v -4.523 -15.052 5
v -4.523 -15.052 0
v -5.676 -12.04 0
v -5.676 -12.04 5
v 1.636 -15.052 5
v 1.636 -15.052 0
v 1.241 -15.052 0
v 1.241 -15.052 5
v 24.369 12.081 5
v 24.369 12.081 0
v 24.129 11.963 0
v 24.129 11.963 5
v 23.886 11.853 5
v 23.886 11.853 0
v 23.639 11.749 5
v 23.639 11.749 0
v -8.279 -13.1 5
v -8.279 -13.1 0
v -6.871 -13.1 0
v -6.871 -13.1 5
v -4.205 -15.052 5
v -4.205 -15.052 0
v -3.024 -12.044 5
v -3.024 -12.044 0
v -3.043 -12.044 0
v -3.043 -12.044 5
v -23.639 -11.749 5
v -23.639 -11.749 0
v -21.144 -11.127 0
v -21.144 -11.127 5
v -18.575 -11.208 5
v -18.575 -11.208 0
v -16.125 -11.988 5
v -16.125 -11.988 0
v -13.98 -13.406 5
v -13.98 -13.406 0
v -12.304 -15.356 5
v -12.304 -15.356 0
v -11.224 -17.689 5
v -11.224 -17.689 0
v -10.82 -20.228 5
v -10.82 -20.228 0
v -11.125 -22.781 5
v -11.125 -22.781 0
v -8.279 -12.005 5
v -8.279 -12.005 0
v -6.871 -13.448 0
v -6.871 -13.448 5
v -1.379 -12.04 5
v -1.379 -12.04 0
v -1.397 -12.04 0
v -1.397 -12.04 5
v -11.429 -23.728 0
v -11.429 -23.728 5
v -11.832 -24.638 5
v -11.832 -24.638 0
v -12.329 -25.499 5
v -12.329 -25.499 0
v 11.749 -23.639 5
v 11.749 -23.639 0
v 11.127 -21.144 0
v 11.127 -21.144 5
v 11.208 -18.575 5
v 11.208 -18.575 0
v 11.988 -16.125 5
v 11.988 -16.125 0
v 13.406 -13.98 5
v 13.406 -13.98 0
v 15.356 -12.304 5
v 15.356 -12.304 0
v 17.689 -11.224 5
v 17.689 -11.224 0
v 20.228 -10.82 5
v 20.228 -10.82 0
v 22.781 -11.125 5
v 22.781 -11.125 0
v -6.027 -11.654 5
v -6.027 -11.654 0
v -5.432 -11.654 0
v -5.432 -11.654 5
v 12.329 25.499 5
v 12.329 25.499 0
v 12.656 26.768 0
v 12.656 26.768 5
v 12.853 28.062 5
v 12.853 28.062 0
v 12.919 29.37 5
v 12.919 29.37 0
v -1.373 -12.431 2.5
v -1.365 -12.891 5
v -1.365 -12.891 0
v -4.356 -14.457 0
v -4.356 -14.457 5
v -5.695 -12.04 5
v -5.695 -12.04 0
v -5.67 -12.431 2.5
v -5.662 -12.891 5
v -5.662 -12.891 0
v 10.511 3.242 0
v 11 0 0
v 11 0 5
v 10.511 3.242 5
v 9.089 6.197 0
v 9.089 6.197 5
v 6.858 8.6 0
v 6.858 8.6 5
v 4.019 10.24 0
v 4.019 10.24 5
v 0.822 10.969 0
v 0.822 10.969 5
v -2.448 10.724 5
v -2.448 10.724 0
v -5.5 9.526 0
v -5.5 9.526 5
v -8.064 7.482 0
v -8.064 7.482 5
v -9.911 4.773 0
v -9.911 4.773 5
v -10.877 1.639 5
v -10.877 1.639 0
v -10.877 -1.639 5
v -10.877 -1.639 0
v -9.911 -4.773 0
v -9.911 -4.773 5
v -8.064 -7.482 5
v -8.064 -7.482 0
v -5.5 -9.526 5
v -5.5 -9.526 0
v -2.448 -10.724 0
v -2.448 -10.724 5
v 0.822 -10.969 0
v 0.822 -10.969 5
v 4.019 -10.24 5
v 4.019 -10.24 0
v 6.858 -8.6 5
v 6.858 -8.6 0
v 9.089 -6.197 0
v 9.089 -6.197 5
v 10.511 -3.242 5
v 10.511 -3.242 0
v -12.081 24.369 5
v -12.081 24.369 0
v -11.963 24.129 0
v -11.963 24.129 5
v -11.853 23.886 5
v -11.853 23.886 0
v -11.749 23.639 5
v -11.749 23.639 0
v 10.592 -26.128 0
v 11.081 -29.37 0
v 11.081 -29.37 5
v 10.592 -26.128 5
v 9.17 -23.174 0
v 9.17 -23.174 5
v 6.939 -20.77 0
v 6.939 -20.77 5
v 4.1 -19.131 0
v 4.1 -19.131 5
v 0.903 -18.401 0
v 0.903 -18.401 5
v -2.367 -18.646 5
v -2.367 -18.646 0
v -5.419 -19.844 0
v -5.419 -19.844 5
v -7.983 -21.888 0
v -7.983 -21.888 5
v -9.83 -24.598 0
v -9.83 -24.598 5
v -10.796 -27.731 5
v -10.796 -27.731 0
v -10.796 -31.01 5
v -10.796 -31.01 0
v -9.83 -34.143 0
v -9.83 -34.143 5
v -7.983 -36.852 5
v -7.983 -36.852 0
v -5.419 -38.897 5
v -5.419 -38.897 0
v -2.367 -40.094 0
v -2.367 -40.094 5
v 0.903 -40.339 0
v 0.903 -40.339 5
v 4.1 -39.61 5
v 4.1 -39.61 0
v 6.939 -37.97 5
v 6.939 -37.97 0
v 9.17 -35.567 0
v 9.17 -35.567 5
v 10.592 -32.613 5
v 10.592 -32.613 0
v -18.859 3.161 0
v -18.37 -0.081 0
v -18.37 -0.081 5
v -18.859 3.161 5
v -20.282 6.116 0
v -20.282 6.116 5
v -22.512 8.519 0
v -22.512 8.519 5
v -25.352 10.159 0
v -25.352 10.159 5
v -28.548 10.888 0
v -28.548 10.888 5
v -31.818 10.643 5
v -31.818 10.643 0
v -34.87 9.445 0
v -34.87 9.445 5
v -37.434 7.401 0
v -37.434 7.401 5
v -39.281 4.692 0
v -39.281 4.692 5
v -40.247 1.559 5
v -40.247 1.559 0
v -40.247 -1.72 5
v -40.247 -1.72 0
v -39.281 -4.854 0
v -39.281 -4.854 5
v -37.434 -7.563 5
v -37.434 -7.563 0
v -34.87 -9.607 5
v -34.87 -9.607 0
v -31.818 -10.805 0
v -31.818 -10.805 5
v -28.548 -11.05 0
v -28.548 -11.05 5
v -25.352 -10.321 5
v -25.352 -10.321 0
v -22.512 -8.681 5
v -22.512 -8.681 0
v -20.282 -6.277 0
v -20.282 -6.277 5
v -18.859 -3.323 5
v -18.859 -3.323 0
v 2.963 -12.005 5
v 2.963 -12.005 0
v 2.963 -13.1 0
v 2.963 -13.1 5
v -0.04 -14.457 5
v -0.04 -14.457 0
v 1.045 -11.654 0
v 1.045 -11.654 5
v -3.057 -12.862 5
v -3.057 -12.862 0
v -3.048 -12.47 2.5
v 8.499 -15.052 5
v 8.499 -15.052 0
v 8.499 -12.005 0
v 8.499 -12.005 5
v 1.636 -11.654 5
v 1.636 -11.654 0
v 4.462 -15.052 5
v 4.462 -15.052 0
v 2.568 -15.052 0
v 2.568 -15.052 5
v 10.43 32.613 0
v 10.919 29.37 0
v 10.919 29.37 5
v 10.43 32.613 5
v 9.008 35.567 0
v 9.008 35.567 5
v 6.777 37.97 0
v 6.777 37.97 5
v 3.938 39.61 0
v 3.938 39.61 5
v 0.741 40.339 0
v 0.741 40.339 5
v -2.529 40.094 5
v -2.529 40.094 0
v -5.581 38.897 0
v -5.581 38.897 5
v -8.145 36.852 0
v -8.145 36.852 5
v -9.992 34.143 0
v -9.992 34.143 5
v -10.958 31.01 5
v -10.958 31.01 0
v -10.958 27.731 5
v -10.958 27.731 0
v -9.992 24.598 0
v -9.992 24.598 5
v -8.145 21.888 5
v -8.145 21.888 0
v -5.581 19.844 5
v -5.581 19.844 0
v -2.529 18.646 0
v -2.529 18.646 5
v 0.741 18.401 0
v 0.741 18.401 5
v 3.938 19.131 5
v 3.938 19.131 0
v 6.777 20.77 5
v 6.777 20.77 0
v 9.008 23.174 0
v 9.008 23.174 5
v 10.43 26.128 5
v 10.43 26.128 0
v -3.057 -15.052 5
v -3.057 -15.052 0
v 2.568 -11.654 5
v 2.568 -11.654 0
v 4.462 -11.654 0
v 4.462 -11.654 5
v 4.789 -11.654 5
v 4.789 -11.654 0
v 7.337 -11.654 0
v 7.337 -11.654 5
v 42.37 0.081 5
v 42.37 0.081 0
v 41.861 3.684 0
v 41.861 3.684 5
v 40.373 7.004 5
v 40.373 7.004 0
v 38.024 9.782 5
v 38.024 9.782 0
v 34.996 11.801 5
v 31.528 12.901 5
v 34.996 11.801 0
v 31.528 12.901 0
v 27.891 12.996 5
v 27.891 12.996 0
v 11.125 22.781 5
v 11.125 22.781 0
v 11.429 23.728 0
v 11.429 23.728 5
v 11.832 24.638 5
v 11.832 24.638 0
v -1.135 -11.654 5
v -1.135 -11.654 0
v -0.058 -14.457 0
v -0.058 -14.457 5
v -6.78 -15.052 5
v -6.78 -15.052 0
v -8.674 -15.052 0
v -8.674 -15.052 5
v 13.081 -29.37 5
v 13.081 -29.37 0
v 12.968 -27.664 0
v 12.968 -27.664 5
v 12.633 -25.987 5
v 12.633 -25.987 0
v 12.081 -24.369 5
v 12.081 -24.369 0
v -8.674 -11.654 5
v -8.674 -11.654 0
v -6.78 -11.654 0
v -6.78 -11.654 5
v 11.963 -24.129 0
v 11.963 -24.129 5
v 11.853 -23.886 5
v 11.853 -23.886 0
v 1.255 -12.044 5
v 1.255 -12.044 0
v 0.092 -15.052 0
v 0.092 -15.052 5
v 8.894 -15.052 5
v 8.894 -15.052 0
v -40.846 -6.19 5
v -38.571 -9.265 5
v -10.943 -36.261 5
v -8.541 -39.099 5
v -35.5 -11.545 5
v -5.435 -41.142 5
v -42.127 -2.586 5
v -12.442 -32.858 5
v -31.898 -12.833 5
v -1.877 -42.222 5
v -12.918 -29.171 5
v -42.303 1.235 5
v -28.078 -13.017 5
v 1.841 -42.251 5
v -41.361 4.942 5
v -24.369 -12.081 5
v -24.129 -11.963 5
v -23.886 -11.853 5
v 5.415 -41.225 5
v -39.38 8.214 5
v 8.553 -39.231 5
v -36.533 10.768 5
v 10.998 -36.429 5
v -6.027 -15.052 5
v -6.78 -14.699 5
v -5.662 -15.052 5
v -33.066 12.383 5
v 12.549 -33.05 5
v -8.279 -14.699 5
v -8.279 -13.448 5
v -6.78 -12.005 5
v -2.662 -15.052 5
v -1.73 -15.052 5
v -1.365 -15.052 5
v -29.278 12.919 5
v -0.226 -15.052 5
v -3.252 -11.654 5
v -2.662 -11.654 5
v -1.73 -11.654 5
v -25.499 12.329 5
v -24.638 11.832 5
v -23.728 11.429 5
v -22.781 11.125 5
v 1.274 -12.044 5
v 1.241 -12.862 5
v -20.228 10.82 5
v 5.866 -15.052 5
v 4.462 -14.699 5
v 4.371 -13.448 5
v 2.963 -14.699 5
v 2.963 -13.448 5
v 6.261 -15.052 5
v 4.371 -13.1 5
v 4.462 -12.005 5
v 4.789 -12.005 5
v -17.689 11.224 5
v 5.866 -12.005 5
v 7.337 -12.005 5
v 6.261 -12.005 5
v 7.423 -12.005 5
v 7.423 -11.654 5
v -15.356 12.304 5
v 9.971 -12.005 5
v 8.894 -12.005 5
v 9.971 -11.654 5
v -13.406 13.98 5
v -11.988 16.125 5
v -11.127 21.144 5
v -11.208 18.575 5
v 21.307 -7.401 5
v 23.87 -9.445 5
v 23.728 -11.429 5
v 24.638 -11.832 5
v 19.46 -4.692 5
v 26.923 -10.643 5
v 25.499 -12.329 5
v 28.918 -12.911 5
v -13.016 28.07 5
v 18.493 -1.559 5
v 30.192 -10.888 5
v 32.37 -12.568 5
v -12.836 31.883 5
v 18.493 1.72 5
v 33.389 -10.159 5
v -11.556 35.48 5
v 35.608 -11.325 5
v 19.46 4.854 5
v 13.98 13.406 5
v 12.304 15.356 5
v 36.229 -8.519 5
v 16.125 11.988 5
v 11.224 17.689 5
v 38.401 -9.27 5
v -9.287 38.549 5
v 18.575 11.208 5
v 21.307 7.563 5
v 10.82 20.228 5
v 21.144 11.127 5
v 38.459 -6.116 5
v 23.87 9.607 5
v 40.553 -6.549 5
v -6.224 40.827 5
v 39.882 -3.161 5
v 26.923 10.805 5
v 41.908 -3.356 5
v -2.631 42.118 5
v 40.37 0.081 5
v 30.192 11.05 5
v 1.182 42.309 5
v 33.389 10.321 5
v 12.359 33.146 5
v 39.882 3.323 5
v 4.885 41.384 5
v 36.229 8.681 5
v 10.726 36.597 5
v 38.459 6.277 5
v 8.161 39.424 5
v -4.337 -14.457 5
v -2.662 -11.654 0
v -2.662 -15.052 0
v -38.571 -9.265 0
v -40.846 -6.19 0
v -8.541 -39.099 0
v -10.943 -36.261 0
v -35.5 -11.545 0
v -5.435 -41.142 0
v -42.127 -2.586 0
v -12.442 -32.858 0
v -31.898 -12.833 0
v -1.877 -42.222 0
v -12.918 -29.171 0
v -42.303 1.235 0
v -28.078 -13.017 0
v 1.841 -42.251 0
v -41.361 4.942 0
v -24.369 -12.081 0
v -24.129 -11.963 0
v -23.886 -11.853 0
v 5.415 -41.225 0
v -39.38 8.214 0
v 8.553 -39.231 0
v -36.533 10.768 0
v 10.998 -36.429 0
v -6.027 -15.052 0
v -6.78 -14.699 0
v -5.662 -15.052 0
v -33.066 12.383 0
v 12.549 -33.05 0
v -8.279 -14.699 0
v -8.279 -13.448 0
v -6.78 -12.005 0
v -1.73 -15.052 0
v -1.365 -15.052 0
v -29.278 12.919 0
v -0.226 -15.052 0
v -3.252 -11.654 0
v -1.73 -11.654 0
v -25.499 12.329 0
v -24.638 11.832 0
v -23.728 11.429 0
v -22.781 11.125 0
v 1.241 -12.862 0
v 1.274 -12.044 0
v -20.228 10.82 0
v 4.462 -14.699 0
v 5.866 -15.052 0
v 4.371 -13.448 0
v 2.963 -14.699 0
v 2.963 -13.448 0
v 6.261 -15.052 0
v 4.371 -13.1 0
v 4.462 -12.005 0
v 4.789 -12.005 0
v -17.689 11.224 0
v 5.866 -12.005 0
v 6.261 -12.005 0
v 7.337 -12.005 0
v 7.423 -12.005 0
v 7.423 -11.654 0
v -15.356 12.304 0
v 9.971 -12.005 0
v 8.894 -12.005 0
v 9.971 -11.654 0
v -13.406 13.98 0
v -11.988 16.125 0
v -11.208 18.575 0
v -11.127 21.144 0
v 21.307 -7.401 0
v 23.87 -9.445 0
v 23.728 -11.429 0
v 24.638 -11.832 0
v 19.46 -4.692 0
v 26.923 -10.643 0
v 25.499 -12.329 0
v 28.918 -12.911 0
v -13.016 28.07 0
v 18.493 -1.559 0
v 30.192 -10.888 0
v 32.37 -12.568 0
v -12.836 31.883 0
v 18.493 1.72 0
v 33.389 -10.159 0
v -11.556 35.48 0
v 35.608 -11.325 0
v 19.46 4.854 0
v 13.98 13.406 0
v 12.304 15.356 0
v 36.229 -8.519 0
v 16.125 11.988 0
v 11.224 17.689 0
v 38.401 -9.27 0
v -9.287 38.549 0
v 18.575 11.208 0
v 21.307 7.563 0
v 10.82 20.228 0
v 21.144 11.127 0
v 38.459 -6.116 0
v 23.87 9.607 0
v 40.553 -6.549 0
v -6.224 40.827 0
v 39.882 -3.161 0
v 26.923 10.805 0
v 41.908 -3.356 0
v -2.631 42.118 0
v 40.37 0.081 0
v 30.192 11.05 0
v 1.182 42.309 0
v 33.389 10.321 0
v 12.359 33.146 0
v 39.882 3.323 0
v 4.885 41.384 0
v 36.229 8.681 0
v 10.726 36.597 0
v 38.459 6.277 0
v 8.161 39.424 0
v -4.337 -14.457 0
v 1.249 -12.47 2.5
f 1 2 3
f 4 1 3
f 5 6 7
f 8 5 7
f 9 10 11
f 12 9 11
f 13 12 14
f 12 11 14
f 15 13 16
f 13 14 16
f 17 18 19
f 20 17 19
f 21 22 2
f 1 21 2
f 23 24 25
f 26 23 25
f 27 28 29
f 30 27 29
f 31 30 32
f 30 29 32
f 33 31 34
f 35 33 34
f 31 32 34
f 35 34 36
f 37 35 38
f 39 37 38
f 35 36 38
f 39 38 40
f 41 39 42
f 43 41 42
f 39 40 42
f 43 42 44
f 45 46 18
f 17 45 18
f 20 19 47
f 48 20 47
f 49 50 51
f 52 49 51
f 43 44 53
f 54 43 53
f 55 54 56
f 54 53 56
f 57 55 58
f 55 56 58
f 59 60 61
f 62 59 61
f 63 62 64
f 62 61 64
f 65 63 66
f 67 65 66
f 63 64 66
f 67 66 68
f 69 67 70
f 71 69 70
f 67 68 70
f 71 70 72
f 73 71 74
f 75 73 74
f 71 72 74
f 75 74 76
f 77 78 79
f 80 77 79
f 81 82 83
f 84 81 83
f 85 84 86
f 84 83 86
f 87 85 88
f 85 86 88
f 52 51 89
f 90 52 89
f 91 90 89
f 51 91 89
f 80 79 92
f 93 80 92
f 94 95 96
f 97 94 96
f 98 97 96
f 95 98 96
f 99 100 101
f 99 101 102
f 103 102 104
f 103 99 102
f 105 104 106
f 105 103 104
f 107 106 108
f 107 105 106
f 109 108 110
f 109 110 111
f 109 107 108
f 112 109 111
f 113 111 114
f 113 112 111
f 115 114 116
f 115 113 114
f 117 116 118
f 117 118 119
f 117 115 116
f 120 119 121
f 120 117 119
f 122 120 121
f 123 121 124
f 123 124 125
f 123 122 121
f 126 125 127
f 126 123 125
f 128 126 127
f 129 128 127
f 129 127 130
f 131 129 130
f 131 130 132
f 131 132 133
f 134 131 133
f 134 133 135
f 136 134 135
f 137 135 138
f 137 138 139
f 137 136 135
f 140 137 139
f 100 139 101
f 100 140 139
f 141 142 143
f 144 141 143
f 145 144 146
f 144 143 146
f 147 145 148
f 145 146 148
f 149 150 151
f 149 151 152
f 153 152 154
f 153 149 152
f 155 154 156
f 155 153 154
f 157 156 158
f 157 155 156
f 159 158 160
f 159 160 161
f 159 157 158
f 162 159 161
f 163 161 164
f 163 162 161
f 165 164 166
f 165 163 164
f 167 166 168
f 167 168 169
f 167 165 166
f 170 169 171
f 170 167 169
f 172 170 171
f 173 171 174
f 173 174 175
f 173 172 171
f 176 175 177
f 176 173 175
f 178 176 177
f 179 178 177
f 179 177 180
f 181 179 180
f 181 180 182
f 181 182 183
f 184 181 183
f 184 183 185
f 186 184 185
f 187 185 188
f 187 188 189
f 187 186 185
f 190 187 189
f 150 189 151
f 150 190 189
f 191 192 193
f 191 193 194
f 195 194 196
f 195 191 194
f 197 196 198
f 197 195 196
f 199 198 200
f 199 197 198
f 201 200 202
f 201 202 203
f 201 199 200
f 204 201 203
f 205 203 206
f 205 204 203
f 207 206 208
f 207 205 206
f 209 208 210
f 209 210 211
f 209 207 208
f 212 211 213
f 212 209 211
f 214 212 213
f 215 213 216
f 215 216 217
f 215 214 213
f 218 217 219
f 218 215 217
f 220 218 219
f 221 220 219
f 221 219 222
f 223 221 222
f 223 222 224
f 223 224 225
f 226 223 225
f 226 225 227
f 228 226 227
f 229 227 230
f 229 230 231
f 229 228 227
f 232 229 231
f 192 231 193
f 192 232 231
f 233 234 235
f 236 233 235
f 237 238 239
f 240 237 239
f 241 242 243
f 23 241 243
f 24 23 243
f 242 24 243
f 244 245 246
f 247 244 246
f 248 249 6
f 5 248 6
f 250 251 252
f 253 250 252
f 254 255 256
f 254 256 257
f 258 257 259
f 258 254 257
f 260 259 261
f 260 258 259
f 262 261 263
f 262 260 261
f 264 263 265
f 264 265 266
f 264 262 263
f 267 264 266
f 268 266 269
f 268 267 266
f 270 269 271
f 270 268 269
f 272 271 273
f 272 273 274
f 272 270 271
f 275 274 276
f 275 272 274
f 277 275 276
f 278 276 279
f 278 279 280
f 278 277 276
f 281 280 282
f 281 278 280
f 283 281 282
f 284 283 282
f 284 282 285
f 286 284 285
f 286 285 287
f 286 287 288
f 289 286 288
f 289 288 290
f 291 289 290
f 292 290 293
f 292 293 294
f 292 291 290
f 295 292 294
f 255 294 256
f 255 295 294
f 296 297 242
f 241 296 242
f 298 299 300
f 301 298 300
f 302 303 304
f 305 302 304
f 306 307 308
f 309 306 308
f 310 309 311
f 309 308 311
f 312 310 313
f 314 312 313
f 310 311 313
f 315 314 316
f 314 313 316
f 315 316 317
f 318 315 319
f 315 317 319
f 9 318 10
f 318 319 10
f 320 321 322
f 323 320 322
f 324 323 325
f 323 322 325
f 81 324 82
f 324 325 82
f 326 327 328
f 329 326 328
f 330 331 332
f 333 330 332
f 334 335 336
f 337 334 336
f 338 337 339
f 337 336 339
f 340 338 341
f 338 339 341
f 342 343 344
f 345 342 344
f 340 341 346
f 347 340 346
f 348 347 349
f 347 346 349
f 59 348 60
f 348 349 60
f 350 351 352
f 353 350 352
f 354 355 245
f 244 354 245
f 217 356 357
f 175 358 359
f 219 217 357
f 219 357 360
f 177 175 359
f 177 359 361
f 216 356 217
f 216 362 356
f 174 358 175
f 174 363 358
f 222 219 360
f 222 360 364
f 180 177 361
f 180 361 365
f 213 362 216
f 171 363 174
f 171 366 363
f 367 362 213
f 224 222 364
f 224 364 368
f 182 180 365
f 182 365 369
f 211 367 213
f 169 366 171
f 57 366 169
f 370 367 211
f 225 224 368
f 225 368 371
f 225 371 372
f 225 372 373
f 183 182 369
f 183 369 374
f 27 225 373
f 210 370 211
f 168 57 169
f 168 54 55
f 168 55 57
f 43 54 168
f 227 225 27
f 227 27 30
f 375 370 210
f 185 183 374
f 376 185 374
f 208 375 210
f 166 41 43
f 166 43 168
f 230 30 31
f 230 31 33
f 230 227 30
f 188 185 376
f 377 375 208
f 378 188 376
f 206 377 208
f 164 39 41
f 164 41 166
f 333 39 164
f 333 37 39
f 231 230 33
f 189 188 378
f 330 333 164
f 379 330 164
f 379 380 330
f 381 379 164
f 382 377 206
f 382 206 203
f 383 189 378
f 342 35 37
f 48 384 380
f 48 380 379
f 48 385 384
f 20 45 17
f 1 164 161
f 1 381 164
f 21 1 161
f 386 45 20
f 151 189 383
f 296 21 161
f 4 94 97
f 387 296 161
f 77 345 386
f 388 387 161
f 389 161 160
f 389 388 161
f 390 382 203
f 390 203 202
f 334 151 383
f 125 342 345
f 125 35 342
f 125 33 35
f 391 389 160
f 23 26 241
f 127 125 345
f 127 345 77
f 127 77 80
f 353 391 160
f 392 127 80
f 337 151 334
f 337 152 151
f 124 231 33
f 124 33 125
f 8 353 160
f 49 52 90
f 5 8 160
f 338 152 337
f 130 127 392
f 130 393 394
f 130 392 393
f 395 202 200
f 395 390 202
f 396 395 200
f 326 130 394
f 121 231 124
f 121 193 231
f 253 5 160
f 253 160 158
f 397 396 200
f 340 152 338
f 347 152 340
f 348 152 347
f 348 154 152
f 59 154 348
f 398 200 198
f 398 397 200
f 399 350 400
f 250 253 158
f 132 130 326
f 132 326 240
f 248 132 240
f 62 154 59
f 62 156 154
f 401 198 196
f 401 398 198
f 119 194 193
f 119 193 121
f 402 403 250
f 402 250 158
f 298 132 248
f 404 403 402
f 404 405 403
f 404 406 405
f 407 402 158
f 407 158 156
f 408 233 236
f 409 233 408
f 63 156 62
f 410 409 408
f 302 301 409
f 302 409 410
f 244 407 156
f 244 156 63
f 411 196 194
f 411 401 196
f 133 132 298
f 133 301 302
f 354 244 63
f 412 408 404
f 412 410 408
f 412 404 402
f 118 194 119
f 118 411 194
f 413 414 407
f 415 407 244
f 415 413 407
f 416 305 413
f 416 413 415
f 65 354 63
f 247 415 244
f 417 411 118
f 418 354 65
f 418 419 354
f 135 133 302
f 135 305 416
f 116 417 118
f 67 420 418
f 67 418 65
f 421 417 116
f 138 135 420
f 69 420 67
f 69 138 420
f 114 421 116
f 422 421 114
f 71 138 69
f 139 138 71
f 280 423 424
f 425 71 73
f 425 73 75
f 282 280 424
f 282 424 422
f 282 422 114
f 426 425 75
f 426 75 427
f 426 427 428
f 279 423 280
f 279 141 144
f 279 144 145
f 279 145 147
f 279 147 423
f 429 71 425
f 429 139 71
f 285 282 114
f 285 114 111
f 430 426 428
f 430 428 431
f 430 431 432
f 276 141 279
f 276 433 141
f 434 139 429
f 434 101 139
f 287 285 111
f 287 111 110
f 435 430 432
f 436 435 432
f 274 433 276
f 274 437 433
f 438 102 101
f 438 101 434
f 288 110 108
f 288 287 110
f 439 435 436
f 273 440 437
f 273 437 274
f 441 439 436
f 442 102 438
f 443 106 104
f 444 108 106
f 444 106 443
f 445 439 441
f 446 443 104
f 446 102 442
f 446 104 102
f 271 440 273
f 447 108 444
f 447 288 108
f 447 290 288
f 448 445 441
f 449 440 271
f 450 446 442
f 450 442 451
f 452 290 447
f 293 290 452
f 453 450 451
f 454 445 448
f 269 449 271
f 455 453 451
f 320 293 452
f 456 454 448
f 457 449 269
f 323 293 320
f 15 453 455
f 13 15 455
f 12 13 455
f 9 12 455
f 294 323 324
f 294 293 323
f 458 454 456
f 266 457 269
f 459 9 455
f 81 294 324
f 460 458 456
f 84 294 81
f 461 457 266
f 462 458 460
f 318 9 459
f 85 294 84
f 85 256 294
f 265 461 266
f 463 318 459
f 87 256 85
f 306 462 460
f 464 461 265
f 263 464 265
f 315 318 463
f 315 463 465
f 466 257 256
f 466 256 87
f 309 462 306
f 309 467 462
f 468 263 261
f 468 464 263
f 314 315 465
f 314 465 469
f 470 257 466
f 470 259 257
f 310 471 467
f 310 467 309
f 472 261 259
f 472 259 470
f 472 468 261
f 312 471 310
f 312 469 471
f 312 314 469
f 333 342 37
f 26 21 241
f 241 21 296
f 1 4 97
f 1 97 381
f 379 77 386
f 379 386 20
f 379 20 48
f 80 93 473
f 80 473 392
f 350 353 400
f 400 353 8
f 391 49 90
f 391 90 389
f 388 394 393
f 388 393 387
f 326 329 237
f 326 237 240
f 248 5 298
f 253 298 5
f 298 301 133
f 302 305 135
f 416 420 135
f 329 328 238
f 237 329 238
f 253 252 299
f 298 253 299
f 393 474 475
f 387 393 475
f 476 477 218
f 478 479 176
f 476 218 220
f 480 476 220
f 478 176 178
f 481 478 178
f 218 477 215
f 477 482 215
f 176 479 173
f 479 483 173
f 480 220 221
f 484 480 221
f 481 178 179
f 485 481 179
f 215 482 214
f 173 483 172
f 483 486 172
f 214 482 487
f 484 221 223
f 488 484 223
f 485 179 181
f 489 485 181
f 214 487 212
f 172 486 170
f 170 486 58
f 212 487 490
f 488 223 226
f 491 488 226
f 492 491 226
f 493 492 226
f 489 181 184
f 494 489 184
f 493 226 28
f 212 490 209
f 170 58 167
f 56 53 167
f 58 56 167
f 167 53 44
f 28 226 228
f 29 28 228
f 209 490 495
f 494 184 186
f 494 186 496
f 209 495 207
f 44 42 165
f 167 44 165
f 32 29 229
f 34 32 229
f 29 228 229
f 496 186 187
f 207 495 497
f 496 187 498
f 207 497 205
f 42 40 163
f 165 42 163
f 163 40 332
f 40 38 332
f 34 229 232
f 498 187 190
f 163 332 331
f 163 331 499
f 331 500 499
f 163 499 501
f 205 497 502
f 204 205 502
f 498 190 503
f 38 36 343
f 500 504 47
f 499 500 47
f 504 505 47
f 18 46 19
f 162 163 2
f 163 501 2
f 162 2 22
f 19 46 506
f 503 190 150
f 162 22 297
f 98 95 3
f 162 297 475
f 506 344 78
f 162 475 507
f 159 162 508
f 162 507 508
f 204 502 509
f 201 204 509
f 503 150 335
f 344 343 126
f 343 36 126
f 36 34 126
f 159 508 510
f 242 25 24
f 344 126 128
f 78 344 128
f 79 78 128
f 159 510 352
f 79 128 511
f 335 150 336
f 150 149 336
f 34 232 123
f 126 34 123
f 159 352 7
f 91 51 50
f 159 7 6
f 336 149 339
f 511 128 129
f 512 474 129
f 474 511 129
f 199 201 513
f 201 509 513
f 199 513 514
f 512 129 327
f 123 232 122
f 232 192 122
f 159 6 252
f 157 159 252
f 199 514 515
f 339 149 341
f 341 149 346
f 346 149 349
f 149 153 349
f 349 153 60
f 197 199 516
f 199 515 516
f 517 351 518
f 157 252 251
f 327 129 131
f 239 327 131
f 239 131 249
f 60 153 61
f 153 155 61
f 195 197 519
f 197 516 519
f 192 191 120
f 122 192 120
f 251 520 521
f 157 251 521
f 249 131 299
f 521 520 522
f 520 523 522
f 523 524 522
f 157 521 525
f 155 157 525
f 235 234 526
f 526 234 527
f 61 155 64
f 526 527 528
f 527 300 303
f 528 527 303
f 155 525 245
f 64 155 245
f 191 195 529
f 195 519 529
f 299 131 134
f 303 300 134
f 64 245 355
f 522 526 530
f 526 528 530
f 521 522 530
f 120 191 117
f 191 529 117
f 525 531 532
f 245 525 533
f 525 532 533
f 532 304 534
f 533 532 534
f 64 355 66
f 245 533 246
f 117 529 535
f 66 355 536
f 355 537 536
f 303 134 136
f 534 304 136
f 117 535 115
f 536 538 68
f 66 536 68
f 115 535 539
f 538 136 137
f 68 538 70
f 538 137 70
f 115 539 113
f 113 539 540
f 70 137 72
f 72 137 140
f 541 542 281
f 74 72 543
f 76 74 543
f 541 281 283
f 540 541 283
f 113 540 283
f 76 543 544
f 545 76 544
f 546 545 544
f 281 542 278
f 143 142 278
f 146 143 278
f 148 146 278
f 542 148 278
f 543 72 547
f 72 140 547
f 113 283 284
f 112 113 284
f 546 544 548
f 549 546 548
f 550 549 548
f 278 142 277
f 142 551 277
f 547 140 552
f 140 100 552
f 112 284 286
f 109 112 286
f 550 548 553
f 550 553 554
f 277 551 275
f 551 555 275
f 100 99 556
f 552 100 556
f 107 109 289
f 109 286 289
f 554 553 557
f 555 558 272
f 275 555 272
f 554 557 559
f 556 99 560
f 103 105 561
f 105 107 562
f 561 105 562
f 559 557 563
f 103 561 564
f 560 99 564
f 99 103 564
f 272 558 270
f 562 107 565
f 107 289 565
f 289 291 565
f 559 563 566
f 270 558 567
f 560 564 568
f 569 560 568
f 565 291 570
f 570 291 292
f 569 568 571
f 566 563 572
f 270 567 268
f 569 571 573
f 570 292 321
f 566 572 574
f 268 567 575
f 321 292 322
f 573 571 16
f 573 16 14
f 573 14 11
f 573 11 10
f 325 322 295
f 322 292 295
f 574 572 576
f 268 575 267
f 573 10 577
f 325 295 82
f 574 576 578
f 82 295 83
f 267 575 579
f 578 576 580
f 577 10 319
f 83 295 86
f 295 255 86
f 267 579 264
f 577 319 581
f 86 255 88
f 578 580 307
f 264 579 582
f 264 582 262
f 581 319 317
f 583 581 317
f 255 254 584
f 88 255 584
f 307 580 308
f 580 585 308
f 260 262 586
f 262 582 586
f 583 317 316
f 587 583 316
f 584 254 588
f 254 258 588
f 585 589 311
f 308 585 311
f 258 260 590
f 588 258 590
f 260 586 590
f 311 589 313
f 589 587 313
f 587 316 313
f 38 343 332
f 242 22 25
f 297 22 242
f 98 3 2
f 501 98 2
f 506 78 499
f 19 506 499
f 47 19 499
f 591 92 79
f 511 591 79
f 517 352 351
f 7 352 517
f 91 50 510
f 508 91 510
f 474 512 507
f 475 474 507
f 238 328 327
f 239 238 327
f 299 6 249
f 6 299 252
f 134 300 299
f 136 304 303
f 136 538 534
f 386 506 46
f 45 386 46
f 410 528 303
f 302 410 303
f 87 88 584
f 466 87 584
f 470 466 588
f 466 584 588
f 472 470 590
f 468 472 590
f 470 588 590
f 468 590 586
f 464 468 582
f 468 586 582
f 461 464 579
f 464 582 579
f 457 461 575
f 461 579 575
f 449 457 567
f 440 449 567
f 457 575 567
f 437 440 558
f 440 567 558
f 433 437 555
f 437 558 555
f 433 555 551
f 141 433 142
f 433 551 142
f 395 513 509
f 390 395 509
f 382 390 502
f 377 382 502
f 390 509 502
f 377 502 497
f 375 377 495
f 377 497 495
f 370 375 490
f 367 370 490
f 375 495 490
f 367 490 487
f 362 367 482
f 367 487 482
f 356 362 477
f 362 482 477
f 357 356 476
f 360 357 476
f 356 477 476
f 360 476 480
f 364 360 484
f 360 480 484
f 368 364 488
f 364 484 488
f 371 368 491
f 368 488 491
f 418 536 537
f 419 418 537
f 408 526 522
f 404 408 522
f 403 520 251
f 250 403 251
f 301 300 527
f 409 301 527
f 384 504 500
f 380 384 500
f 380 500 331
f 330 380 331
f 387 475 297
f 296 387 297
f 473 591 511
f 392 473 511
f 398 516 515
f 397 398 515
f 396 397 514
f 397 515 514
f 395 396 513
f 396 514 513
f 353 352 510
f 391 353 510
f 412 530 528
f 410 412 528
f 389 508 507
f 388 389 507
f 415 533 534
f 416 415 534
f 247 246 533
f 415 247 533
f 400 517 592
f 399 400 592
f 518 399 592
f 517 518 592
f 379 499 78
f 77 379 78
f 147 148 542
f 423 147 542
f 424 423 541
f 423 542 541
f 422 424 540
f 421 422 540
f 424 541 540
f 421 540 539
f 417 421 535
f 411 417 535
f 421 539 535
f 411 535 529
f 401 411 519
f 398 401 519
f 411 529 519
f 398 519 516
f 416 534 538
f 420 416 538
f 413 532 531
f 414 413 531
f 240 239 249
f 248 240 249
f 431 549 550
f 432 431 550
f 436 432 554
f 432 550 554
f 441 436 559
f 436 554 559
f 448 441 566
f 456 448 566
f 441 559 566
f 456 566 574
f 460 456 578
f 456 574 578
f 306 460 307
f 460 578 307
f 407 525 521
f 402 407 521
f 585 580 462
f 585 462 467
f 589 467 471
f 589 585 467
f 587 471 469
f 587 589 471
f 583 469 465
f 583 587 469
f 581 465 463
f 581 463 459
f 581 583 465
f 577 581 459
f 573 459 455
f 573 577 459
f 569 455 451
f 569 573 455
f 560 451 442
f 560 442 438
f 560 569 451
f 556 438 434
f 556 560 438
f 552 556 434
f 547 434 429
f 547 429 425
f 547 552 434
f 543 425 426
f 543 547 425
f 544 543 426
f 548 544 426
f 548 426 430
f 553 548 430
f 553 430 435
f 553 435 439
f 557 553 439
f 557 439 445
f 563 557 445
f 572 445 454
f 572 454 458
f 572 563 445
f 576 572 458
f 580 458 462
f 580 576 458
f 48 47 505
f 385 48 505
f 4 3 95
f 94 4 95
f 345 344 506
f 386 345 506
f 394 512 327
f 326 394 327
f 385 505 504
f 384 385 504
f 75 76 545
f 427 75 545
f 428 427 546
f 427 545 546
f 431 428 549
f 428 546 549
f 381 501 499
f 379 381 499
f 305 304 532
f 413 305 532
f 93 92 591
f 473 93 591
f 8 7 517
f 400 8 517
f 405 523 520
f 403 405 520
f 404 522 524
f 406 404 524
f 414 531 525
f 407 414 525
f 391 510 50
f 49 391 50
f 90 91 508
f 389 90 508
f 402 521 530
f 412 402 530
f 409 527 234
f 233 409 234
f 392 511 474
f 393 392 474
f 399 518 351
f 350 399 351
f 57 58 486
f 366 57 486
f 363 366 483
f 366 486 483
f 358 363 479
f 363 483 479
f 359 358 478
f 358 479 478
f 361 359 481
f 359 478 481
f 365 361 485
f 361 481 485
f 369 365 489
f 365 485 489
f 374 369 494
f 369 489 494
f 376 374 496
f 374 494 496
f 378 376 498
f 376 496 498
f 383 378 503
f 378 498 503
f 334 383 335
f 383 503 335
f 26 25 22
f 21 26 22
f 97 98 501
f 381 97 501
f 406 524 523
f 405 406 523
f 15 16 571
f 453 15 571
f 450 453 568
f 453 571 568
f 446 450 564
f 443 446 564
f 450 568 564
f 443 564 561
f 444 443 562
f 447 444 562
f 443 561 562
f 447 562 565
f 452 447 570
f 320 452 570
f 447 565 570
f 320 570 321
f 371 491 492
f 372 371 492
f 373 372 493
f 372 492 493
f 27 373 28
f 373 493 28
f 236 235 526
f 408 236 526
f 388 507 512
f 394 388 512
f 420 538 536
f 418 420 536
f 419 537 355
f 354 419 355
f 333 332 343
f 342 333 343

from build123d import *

# Parameters (mm, degrees)
F0_R     = 11
F1_DEPTH = 5


with BuildPart() as f1:
    # F0 (on Top) → F1 (new body)
    with BuildSketch(Plane.XY):
        with BuildLine():
            ThreePointArc((24.3693606457, 12.0805580484), (24.0077279335, 11.9071162023), (23.6389782963, 11.7493695776))
            ThreePointArc((23.6389782963, 11.7493695776), (16.3793921161, 0.5682163901), (22.7809509477, -11.1253640126))
            ThreePointArc((22.7809509477, -11.1253640126), (24.1883269703, -11.6184397697), (25.4992191241, -12.3293495618))
            ThreePointArc((25.4992191241, -12.3293495618), (37.0733893442, -10.3910189502), (42.3702563381, 0.0809312927))
            ThreePointArc((42.3702563381, 0.0809312927), (36.5809551946, 10.8978542378), (24.3693606457, 12.0805580484))
        make_face()
        with Locations((29.3702563381, 0.0809312927)):
            Circle(F0_R, mode=Mode.SUBTRACT)
        with BuildLine():
            ThreePointArc((12.0805580484, -24.3693606457), (11.9071162023, -24.0077279335), (11.7493695776, -23.6389782963))
            ThreePointArc((11.7493695776, -23.6389782963), (0.5682163901, -16.3793921161), (-11.1253640126, -22.7809509477))
            ThreePointArc((-11.1253640126, -22.7809509477), (-11.6184397697, -24.1883269703), (-12.3293495618, -25.4992191241))
            ThreePointArc((-12.3293495618, -25.4992191241), (-1.8769181513, -42.2219809521), (13.0809312927, -29.3702563381))
            ThreePointArc((13.0809312927, -29.3702563381), (12.8283849173, -26.8202708306), (12.0805580484, -24.3693606457))
        make_face()
        with Locations((0.0809312927, -29.3702563381)):
            Circle(F0_R, mode=Mode.SUBTRACT)
        with BuildLine():
            ThreePointArc((-16.3702563381, -0.0809312927), (-18.0861752928, 6.3742615752), (-22.7809509477, 11.1253640126))
            ThreePointArc((-22.7809509477, 11.1253640126), (-24.1883269703, 11.6184397697), (-25.4992191241, 12.3293495618))
            ThreePointArc((-25.4992191241, 12.3293495618), (-42.3563525859, -0.6820171789), (-24.3693606457, -12.0805580484))
            ThreePointArc((-24.3693606457, -12.0805580484), (-24.0077279335, -11.9071162023), (-23.6389782963, -11.7493695776))
            ThreePointArc((-23.6389782963, -11.7493695776), (-18.336068227, -6.9545542624), (-16.3702563381, -0.0809312927))
        make_face()
        with Locations((-29.3702563381, -0.0809312927)):
            Circle(F0_R, mode=Mode.SUBTRACT)
        with BuildLine():
            ThreePointArc((12.3293495618, 25.4992191241), (12.7707933213, 27.412406894), (12.9190687073, 29.3702563381))
            ThreePointArc((12.9190687073, 29.3702563381), (-2.6309168002, 42.1177099627), (-12.0805580484, 24.3693606457))
            ThreePointArc((-12.0805580484, 24.3693606457), (-11.9071162023, 24.0077279335), (-11.7493695776, 23.6389782963))
            ThreePointArc((-11.7493695776, 23.6389782963), (-0.5682163901, 16.3793921161), (11.1253640126, 22.7809509477))
            ThreePointArc((11.1253640126, 22.7809509477), (11.6184397697, 24.1883269703), (12.3293495618, 25.4992191241))
        make_face()
        with Locations((-0.0809312927, 29.3702563381)):
            Circle(F0_R, mode=Mode.SUBTRACT)
        with BuildLine():
            ThreePointArc((11.1253640126, 22.7809509477), (-0.5682163901, 16.3793921161), (-11.7493695776, 23.6389782963))
            ThreePointArc((-11.7493695776, 23.6389782963), (-13.4063117417, 13.9803401177), (-22.7809509477, 11.1253640126))
            ThreePointArc((-22.7809509477, 11.1253640126), (-18.0861752928, 6.3742615752), (-16.3702563381, -0.0809312927))
            ThreePointArc((-16.3702563381, -0.0809312927), (-18.336068227, -6.9545542624), (-23.6389782963, -11.7493695776))
            ThreePointArc((-23.6389782963, -11.7493695776), (-13.9803401177, -13.4063117417), (-11.1253640126, -22.7809509477))
            ThreePointArc((-11.1253640126, -22.7809509477), (0.5682163901, -16.3793921161), (11.7493695776, -23.6389782963))
            ThreePointArc((11.7493695776, -23.6389782963), (13.4063117417, -13.9803401177), (22.7809509477, -11.1253640126))
            ThreePointArc((22.7809509477, -11.1253640126), (16.3793921161, 0.5682163901), (23.6389782963, 11.7493695776))
            ThreePointArc((23.6389782963, 11.7493695776), (13.9803401177, 13.4063117417), (11.1253640126, 22.7809509477))
        make_face()
        Polygon((-6.780023326, -14.6987217482), (-6.780023326, -15.0520168245), (-8.6744287142, -15.0520168245), (-8.6744287142, -11.6536900799), (-6.780023326, -11.6536900799), (-6.780023326, -12.0047538189), (-8.2794820078, -12.0047538189), (-8.2794820078, -13.0995966659), (-6.8707643772, -13.0995966659), (-6.8707643772, -13.4484290676), (-8.2794820078, -13.4484290676), (-8.2794820078, -14.6987217482), align=None, mode=Mode.SUBTRACT)
        with BuildLine():
            Line((-4.205060054, -15.0520168245), (-4.5233975123, -15.0520168245))
            Line((-4.5233975123, -15.0520168245), (-5.6762551297, -12.039711437))
            Line((-5.6762551297, -12.039711437), (-5.6948496074, -12.039711437))
            add(Edge.make_bspline(
                [(-5.6948496074, -12.039711437), (-5.6621233267, -12.3974691879), (-5.6621233267, -12.8905947365)],
                knots=[0, 0, 0, 1, 1, 1], degree=2))
            Line((-5.6621233267, -12.8905947365), (-5.6621233267, -15.0520168245))
            Line((-5.6621233267, -15.0520168245), (-6.0273188687, -15.0520168245))
            Line((-6.0273188687, -15.0520168245), (-6.0273188687, -11.6536900799))
            Line((-6.0273188687, -11.6536900799), (-5.4322955823, -11.6536900799))
            Line((-5.4322955823, -11.6536900799), (-4.3560472129, -14.4569935381))
            Line((-4.3560472129, -14.4569935381), (-4.3374527352, -14.4569935381))
            Line((-4.3374527352, -14.4569935381), (-3.2522790166, -11.6536900799))
            Line((-3.2522790166, -11.6536900799), (-2.6617184049, -11.6536900799))
            Line((-2.6617184049, -11.6536900799), (-2.6617184049, -15.0520168245))
            Line((-2.6617184049, -15.0520168245), (-3.0566651112, -15.0520168245))
            Line((-3.0566651112, -15.0520168245), (-3.0566651112, -12.8623311304))
            add(Edge.make_bspline(
                [(-3.0566651112, -12.8623311304), (-3.0566651112, -12.4859789018), (-3.0239388305, -12.0441741116)],
                knots=[0, 0, 0, 1, 1, 1], degree=2))
            Line((-3.0239388305, -12.0441741116), (-3.0425333082, -12.0441741116))
            Line((-3.0425333082, -12.0441741116), (-4.205060054, -15.0520168245))
        make_face(mode=Mode.SUBTRACT)
        with BuildLine():
            Line((0.0924956322, -15.0520168245), (-0.225841826, -15.0520168245))
            Line((-0.225841826, -15.0520168245), (-1.3786994435, -12.039711437))
            Line((-1.3786994435, -12.039711437), (-1.3972939212, -12.039711437))
            add(Edge.make_bspline(
                [(-1.3972939212, -12.039711437), (-1.3645676404, -12.3974691879), (-1.3645676404, -12.8905947365)],
                knots=[0, 0, 0, 1, 1, 1], degree=2))
            Line((-1.3645676404, -12.8905947365), (-1.3645676404, -15.0520168245))
            Line((-1.3645676404, -15.0520168245), (-1.7297631825, -15.0520168245))
            Line((-1.7297631825, -15.0520168245), (-1.7297631825, -11.6536900799))
            Line((-1.7297631825, -11.6536900799), (-1.1347398961, -11.6536900799))
            Line((-1.1347398961, -11.6536900799), (-0.0584915267, -14.4569935381))
            Line((-0.0584915267, -14.4569935381), (-0.039897049, -14.4569935381))
            Line((-0.039897049, -14.4569935381), (1.0452766696, -11.6536900799))
            Line((1.0452766696, -11.6536900799), (1.6358372814, -11.6536900799))
            Line((1.6358372814, -11.6536900799), (1.6358372814, -15.0520168245))
            Line((1.6358372814, -15.0520168245), (1.240890575, -15.0520168245))
            Line((1.240890575, -15.0520168245), (1.240890575, -12.8623311304))
            add(Edge.make_bspline(
                [(1.240890575, -12.8623311304), (1.240890575, -12.4859789018), (1.2736168557, -12.0441741116)],
                knots=[0, 0, 0, 1, 1, 1], degree=2))
            Line((1.2736168557, -12.0441741116), (1.255022378, -12.0441741116))
            Line((1.255022378, -12.0441741116), (0.0924956322, -15.0520168245))
        make_face(mode=Mode.SUBTRACT)
        Polygon((4.4621978919, -14.6987217482), (4.4621978919, -15.0520168245), (2.5677925037, -15.0520168245), (2.5677925037, -11.6536900799), (4.4621978919, -11.6536900799), (4.4621978919, -12.0047538189), (2.9627392101, -12.0047538189), (2.9627392101, -13.0995966659), (4.3714568407, -13.0995966659), (4.3714568407, -13.4484290676), (2.9627392101, -13.4484290676), (2.9627392101, -14.6987217482), align=None, mode=Mode.SUBTRACT)
        Polygon((6.2606557751, -12.0047538189), (6.2606557751, -15.0520168245), (5.8657090687, -15.0520168245), (5.8657090687, -12.0047538189), (4.7894606994, -12.0047538189), (4.7894606994, -11.6536900799), (7.3369041444, -11.6536900799), (7.3369041444, -12.0047538189), align=None, mode=Mode.SUBTRACT)
        Polygon((8.8943775966, -12.0047538189), (8.8943775966, -15.0520168245), (8.4994308903, -15.0520168245), (8.4994308903, -12.0047538189), (7.423182521, -12.0047538189), (7.423182521, -11.6536900799), (9.970625966, -11.6536900799), (9.970625966, -12.0047538189), align=None, mode=Mode.SUBTRACT)
        Circle(F0_R, mode=Mode.SUBTRACT)
    extrude(amount=F1_DEPTH)


solid = f1.part
